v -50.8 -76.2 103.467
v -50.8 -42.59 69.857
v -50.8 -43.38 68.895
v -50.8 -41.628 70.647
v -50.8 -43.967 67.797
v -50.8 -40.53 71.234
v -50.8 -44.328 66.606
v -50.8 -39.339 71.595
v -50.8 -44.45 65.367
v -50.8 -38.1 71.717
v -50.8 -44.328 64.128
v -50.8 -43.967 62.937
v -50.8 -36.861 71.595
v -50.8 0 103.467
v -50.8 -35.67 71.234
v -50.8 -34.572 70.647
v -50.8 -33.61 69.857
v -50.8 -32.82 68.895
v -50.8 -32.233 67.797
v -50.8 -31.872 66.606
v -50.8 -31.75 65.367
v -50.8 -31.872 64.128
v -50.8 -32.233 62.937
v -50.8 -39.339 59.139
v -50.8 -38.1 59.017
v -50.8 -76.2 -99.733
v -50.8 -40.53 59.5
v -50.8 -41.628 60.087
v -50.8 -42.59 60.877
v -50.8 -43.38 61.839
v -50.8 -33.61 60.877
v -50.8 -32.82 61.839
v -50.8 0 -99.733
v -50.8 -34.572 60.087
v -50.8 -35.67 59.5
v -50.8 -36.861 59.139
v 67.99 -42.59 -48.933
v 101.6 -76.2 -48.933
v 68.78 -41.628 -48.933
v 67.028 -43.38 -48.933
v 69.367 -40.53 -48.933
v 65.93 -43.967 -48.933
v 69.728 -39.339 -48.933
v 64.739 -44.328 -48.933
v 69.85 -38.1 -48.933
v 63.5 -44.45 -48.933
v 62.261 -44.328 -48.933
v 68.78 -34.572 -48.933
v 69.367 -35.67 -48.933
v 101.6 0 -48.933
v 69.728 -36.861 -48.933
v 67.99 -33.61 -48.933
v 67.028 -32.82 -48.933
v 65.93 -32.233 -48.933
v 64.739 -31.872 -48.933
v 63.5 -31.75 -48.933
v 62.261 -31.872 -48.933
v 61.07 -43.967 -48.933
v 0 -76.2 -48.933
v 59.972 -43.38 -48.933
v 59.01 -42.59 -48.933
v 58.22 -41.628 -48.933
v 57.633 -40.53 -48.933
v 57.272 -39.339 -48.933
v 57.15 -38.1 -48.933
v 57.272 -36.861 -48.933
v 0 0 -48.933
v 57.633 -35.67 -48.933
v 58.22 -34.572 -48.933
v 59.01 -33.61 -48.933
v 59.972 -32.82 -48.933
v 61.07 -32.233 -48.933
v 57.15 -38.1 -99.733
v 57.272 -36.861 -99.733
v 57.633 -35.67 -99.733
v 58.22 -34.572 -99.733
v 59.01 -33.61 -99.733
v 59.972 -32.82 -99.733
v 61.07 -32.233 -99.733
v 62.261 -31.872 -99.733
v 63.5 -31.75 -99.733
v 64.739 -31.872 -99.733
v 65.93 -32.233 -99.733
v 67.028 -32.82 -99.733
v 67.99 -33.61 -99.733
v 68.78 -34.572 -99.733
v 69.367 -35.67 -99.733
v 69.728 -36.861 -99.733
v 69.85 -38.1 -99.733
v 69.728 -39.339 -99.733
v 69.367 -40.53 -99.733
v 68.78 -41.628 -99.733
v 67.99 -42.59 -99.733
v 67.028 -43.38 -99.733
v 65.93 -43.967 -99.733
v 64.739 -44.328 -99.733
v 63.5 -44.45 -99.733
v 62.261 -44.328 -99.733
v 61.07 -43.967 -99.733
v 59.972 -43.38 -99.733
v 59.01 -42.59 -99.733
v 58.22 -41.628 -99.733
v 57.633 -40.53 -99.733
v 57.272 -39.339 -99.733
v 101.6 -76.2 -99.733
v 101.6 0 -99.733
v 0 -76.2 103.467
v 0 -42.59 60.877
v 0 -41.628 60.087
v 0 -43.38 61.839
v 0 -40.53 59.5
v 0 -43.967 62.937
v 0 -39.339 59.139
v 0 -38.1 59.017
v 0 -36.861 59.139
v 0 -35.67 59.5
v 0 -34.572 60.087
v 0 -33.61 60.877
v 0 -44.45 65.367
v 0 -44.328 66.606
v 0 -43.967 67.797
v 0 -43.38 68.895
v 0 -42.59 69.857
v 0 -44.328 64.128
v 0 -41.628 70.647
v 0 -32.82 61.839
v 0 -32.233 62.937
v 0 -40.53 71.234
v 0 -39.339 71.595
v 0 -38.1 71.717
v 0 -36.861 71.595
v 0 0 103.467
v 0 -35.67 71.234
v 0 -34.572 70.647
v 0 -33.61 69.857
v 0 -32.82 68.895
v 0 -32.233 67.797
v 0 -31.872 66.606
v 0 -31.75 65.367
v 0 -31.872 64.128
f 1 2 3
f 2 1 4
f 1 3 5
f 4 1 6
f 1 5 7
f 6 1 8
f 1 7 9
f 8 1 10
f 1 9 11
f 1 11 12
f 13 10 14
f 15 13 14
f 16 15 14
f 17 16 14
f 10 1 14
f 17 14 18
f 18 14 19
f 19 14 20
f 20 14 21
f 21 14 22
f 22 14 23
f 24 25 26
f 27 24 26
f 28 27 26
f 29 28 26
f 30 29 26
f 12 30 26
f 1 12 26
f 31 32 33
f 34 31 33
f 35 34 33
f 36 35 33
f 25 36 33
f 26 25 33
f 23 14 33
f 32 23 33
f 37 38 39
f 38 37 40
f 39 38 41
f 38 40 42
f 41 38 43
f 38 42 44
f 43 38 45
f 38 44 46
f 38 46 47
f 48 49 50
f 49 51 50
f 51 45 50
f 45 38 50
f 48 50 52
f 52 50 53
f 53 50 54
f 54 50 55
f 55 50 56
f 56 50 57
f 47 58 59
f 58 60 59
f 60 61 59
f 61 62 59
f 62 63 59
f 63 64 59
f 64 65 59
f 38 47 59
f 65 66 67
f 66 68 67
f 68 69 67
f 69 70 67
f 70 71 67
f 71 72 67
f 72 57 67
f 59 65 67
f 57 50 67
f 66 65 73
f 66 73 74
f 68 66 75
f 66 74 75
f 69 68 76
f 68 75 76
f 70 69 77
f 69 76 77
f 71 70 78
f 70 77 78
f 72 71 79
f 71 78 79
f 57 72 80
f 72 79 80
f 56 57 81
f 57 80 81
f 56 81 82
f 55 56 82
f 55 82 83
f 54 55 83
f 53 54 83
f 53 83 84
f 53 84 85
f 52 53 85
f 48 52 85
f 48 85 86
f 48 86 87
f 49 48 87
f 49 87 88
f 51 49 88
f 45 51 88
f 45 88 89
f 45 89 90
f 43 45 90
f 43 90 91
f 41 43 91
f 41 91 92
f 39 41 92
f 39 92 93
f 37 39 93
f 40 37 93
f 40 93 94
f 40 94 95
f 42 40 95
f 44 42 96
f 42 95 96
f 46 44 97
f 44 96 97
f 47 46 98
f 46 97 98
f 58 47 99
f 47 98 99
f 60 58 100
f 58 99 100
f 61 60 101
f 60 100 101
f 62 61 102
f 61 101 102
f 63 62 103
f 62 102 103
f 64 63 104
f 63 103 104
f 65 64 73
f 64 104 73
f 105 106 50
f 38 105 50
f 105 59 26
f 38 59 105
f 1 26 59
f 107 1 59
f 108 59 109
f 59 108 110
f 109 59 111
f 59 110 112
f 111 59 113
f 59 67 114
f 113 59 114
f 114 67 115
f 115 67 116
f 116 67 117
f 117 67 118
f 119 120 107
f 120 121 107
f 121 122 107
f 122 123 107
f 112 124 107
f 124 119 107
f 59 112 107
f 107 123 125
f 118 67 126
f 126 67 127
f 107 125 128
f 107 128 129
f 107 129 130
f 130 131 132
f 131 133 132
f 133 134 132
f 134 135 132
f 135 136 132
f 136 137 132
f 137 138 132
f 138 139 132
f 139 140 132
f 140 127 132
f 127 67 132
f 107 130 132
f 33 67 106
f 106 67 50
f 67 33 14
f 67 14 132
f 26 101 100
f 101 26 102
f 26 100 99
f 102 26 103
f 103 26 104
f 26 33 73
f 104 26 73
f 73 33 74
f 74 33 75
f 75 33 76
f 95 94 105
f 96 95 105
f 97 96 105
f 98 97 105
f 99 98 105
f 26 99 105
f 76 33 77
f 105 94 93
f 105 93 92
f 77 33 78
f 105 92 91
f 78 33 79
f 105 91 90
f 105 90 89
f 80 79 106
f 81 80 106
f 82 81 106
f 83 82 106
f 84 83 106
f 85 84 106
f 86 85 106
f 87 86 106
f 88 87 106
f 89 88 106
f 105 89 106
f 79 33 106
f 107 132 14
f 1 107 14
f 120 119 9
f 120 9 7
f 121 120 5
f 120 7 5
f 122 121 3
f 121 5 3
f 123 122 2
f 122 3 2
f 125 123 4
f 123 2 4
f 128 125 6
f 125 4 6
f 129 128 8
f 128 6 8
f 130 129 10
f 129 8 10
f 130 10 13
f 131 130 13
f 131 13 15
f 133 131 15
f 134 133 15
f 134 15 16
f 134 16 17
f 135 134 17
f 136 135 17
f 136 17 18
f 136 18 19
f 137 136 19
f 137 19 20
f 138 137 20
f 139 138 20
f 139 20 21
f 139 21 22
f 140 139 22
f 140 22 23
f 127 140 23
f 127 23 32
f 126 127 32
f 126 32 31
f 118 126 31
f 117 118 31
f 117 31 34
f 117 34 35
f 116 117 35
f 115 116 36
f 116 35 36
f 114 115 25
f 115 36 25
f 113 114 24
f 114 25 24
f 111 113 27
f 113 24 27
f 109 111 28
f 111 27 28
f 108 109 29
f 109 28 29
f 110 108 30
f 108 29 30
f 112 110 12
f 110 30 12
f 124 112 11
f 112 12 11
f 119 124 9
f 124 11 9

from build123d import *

# Parameters (mm, degrees)
F1_DEPTH = 76.2
F4_D     = 12.7
F6_D     = 12.7


with BuildPart() as f1:
    # F0 (on Front) → F1 (new body)
    with BuildSketch(Plane.XZ):
        Polygon((0, 103.467127), (-50.8, 103.467127), (-50.8, -99.732873), (101.6, -99.732873), (101.6, -48.932873), (0, -48.932873), align=None)
    extrude(amount=F1_DEPTH)

    # F4 (through all)
    with Locations(Plane.YZ):
        with Locations((-38.1, 65.367127)):
            Hole(F4_D / 2)

    # F6 (through all)
    with Locations(Plane.XY.offset(-48.932873)):
        with Locations((63.5, -38.1)):
            Hole(F6_D / 2)


solid = f1.part
